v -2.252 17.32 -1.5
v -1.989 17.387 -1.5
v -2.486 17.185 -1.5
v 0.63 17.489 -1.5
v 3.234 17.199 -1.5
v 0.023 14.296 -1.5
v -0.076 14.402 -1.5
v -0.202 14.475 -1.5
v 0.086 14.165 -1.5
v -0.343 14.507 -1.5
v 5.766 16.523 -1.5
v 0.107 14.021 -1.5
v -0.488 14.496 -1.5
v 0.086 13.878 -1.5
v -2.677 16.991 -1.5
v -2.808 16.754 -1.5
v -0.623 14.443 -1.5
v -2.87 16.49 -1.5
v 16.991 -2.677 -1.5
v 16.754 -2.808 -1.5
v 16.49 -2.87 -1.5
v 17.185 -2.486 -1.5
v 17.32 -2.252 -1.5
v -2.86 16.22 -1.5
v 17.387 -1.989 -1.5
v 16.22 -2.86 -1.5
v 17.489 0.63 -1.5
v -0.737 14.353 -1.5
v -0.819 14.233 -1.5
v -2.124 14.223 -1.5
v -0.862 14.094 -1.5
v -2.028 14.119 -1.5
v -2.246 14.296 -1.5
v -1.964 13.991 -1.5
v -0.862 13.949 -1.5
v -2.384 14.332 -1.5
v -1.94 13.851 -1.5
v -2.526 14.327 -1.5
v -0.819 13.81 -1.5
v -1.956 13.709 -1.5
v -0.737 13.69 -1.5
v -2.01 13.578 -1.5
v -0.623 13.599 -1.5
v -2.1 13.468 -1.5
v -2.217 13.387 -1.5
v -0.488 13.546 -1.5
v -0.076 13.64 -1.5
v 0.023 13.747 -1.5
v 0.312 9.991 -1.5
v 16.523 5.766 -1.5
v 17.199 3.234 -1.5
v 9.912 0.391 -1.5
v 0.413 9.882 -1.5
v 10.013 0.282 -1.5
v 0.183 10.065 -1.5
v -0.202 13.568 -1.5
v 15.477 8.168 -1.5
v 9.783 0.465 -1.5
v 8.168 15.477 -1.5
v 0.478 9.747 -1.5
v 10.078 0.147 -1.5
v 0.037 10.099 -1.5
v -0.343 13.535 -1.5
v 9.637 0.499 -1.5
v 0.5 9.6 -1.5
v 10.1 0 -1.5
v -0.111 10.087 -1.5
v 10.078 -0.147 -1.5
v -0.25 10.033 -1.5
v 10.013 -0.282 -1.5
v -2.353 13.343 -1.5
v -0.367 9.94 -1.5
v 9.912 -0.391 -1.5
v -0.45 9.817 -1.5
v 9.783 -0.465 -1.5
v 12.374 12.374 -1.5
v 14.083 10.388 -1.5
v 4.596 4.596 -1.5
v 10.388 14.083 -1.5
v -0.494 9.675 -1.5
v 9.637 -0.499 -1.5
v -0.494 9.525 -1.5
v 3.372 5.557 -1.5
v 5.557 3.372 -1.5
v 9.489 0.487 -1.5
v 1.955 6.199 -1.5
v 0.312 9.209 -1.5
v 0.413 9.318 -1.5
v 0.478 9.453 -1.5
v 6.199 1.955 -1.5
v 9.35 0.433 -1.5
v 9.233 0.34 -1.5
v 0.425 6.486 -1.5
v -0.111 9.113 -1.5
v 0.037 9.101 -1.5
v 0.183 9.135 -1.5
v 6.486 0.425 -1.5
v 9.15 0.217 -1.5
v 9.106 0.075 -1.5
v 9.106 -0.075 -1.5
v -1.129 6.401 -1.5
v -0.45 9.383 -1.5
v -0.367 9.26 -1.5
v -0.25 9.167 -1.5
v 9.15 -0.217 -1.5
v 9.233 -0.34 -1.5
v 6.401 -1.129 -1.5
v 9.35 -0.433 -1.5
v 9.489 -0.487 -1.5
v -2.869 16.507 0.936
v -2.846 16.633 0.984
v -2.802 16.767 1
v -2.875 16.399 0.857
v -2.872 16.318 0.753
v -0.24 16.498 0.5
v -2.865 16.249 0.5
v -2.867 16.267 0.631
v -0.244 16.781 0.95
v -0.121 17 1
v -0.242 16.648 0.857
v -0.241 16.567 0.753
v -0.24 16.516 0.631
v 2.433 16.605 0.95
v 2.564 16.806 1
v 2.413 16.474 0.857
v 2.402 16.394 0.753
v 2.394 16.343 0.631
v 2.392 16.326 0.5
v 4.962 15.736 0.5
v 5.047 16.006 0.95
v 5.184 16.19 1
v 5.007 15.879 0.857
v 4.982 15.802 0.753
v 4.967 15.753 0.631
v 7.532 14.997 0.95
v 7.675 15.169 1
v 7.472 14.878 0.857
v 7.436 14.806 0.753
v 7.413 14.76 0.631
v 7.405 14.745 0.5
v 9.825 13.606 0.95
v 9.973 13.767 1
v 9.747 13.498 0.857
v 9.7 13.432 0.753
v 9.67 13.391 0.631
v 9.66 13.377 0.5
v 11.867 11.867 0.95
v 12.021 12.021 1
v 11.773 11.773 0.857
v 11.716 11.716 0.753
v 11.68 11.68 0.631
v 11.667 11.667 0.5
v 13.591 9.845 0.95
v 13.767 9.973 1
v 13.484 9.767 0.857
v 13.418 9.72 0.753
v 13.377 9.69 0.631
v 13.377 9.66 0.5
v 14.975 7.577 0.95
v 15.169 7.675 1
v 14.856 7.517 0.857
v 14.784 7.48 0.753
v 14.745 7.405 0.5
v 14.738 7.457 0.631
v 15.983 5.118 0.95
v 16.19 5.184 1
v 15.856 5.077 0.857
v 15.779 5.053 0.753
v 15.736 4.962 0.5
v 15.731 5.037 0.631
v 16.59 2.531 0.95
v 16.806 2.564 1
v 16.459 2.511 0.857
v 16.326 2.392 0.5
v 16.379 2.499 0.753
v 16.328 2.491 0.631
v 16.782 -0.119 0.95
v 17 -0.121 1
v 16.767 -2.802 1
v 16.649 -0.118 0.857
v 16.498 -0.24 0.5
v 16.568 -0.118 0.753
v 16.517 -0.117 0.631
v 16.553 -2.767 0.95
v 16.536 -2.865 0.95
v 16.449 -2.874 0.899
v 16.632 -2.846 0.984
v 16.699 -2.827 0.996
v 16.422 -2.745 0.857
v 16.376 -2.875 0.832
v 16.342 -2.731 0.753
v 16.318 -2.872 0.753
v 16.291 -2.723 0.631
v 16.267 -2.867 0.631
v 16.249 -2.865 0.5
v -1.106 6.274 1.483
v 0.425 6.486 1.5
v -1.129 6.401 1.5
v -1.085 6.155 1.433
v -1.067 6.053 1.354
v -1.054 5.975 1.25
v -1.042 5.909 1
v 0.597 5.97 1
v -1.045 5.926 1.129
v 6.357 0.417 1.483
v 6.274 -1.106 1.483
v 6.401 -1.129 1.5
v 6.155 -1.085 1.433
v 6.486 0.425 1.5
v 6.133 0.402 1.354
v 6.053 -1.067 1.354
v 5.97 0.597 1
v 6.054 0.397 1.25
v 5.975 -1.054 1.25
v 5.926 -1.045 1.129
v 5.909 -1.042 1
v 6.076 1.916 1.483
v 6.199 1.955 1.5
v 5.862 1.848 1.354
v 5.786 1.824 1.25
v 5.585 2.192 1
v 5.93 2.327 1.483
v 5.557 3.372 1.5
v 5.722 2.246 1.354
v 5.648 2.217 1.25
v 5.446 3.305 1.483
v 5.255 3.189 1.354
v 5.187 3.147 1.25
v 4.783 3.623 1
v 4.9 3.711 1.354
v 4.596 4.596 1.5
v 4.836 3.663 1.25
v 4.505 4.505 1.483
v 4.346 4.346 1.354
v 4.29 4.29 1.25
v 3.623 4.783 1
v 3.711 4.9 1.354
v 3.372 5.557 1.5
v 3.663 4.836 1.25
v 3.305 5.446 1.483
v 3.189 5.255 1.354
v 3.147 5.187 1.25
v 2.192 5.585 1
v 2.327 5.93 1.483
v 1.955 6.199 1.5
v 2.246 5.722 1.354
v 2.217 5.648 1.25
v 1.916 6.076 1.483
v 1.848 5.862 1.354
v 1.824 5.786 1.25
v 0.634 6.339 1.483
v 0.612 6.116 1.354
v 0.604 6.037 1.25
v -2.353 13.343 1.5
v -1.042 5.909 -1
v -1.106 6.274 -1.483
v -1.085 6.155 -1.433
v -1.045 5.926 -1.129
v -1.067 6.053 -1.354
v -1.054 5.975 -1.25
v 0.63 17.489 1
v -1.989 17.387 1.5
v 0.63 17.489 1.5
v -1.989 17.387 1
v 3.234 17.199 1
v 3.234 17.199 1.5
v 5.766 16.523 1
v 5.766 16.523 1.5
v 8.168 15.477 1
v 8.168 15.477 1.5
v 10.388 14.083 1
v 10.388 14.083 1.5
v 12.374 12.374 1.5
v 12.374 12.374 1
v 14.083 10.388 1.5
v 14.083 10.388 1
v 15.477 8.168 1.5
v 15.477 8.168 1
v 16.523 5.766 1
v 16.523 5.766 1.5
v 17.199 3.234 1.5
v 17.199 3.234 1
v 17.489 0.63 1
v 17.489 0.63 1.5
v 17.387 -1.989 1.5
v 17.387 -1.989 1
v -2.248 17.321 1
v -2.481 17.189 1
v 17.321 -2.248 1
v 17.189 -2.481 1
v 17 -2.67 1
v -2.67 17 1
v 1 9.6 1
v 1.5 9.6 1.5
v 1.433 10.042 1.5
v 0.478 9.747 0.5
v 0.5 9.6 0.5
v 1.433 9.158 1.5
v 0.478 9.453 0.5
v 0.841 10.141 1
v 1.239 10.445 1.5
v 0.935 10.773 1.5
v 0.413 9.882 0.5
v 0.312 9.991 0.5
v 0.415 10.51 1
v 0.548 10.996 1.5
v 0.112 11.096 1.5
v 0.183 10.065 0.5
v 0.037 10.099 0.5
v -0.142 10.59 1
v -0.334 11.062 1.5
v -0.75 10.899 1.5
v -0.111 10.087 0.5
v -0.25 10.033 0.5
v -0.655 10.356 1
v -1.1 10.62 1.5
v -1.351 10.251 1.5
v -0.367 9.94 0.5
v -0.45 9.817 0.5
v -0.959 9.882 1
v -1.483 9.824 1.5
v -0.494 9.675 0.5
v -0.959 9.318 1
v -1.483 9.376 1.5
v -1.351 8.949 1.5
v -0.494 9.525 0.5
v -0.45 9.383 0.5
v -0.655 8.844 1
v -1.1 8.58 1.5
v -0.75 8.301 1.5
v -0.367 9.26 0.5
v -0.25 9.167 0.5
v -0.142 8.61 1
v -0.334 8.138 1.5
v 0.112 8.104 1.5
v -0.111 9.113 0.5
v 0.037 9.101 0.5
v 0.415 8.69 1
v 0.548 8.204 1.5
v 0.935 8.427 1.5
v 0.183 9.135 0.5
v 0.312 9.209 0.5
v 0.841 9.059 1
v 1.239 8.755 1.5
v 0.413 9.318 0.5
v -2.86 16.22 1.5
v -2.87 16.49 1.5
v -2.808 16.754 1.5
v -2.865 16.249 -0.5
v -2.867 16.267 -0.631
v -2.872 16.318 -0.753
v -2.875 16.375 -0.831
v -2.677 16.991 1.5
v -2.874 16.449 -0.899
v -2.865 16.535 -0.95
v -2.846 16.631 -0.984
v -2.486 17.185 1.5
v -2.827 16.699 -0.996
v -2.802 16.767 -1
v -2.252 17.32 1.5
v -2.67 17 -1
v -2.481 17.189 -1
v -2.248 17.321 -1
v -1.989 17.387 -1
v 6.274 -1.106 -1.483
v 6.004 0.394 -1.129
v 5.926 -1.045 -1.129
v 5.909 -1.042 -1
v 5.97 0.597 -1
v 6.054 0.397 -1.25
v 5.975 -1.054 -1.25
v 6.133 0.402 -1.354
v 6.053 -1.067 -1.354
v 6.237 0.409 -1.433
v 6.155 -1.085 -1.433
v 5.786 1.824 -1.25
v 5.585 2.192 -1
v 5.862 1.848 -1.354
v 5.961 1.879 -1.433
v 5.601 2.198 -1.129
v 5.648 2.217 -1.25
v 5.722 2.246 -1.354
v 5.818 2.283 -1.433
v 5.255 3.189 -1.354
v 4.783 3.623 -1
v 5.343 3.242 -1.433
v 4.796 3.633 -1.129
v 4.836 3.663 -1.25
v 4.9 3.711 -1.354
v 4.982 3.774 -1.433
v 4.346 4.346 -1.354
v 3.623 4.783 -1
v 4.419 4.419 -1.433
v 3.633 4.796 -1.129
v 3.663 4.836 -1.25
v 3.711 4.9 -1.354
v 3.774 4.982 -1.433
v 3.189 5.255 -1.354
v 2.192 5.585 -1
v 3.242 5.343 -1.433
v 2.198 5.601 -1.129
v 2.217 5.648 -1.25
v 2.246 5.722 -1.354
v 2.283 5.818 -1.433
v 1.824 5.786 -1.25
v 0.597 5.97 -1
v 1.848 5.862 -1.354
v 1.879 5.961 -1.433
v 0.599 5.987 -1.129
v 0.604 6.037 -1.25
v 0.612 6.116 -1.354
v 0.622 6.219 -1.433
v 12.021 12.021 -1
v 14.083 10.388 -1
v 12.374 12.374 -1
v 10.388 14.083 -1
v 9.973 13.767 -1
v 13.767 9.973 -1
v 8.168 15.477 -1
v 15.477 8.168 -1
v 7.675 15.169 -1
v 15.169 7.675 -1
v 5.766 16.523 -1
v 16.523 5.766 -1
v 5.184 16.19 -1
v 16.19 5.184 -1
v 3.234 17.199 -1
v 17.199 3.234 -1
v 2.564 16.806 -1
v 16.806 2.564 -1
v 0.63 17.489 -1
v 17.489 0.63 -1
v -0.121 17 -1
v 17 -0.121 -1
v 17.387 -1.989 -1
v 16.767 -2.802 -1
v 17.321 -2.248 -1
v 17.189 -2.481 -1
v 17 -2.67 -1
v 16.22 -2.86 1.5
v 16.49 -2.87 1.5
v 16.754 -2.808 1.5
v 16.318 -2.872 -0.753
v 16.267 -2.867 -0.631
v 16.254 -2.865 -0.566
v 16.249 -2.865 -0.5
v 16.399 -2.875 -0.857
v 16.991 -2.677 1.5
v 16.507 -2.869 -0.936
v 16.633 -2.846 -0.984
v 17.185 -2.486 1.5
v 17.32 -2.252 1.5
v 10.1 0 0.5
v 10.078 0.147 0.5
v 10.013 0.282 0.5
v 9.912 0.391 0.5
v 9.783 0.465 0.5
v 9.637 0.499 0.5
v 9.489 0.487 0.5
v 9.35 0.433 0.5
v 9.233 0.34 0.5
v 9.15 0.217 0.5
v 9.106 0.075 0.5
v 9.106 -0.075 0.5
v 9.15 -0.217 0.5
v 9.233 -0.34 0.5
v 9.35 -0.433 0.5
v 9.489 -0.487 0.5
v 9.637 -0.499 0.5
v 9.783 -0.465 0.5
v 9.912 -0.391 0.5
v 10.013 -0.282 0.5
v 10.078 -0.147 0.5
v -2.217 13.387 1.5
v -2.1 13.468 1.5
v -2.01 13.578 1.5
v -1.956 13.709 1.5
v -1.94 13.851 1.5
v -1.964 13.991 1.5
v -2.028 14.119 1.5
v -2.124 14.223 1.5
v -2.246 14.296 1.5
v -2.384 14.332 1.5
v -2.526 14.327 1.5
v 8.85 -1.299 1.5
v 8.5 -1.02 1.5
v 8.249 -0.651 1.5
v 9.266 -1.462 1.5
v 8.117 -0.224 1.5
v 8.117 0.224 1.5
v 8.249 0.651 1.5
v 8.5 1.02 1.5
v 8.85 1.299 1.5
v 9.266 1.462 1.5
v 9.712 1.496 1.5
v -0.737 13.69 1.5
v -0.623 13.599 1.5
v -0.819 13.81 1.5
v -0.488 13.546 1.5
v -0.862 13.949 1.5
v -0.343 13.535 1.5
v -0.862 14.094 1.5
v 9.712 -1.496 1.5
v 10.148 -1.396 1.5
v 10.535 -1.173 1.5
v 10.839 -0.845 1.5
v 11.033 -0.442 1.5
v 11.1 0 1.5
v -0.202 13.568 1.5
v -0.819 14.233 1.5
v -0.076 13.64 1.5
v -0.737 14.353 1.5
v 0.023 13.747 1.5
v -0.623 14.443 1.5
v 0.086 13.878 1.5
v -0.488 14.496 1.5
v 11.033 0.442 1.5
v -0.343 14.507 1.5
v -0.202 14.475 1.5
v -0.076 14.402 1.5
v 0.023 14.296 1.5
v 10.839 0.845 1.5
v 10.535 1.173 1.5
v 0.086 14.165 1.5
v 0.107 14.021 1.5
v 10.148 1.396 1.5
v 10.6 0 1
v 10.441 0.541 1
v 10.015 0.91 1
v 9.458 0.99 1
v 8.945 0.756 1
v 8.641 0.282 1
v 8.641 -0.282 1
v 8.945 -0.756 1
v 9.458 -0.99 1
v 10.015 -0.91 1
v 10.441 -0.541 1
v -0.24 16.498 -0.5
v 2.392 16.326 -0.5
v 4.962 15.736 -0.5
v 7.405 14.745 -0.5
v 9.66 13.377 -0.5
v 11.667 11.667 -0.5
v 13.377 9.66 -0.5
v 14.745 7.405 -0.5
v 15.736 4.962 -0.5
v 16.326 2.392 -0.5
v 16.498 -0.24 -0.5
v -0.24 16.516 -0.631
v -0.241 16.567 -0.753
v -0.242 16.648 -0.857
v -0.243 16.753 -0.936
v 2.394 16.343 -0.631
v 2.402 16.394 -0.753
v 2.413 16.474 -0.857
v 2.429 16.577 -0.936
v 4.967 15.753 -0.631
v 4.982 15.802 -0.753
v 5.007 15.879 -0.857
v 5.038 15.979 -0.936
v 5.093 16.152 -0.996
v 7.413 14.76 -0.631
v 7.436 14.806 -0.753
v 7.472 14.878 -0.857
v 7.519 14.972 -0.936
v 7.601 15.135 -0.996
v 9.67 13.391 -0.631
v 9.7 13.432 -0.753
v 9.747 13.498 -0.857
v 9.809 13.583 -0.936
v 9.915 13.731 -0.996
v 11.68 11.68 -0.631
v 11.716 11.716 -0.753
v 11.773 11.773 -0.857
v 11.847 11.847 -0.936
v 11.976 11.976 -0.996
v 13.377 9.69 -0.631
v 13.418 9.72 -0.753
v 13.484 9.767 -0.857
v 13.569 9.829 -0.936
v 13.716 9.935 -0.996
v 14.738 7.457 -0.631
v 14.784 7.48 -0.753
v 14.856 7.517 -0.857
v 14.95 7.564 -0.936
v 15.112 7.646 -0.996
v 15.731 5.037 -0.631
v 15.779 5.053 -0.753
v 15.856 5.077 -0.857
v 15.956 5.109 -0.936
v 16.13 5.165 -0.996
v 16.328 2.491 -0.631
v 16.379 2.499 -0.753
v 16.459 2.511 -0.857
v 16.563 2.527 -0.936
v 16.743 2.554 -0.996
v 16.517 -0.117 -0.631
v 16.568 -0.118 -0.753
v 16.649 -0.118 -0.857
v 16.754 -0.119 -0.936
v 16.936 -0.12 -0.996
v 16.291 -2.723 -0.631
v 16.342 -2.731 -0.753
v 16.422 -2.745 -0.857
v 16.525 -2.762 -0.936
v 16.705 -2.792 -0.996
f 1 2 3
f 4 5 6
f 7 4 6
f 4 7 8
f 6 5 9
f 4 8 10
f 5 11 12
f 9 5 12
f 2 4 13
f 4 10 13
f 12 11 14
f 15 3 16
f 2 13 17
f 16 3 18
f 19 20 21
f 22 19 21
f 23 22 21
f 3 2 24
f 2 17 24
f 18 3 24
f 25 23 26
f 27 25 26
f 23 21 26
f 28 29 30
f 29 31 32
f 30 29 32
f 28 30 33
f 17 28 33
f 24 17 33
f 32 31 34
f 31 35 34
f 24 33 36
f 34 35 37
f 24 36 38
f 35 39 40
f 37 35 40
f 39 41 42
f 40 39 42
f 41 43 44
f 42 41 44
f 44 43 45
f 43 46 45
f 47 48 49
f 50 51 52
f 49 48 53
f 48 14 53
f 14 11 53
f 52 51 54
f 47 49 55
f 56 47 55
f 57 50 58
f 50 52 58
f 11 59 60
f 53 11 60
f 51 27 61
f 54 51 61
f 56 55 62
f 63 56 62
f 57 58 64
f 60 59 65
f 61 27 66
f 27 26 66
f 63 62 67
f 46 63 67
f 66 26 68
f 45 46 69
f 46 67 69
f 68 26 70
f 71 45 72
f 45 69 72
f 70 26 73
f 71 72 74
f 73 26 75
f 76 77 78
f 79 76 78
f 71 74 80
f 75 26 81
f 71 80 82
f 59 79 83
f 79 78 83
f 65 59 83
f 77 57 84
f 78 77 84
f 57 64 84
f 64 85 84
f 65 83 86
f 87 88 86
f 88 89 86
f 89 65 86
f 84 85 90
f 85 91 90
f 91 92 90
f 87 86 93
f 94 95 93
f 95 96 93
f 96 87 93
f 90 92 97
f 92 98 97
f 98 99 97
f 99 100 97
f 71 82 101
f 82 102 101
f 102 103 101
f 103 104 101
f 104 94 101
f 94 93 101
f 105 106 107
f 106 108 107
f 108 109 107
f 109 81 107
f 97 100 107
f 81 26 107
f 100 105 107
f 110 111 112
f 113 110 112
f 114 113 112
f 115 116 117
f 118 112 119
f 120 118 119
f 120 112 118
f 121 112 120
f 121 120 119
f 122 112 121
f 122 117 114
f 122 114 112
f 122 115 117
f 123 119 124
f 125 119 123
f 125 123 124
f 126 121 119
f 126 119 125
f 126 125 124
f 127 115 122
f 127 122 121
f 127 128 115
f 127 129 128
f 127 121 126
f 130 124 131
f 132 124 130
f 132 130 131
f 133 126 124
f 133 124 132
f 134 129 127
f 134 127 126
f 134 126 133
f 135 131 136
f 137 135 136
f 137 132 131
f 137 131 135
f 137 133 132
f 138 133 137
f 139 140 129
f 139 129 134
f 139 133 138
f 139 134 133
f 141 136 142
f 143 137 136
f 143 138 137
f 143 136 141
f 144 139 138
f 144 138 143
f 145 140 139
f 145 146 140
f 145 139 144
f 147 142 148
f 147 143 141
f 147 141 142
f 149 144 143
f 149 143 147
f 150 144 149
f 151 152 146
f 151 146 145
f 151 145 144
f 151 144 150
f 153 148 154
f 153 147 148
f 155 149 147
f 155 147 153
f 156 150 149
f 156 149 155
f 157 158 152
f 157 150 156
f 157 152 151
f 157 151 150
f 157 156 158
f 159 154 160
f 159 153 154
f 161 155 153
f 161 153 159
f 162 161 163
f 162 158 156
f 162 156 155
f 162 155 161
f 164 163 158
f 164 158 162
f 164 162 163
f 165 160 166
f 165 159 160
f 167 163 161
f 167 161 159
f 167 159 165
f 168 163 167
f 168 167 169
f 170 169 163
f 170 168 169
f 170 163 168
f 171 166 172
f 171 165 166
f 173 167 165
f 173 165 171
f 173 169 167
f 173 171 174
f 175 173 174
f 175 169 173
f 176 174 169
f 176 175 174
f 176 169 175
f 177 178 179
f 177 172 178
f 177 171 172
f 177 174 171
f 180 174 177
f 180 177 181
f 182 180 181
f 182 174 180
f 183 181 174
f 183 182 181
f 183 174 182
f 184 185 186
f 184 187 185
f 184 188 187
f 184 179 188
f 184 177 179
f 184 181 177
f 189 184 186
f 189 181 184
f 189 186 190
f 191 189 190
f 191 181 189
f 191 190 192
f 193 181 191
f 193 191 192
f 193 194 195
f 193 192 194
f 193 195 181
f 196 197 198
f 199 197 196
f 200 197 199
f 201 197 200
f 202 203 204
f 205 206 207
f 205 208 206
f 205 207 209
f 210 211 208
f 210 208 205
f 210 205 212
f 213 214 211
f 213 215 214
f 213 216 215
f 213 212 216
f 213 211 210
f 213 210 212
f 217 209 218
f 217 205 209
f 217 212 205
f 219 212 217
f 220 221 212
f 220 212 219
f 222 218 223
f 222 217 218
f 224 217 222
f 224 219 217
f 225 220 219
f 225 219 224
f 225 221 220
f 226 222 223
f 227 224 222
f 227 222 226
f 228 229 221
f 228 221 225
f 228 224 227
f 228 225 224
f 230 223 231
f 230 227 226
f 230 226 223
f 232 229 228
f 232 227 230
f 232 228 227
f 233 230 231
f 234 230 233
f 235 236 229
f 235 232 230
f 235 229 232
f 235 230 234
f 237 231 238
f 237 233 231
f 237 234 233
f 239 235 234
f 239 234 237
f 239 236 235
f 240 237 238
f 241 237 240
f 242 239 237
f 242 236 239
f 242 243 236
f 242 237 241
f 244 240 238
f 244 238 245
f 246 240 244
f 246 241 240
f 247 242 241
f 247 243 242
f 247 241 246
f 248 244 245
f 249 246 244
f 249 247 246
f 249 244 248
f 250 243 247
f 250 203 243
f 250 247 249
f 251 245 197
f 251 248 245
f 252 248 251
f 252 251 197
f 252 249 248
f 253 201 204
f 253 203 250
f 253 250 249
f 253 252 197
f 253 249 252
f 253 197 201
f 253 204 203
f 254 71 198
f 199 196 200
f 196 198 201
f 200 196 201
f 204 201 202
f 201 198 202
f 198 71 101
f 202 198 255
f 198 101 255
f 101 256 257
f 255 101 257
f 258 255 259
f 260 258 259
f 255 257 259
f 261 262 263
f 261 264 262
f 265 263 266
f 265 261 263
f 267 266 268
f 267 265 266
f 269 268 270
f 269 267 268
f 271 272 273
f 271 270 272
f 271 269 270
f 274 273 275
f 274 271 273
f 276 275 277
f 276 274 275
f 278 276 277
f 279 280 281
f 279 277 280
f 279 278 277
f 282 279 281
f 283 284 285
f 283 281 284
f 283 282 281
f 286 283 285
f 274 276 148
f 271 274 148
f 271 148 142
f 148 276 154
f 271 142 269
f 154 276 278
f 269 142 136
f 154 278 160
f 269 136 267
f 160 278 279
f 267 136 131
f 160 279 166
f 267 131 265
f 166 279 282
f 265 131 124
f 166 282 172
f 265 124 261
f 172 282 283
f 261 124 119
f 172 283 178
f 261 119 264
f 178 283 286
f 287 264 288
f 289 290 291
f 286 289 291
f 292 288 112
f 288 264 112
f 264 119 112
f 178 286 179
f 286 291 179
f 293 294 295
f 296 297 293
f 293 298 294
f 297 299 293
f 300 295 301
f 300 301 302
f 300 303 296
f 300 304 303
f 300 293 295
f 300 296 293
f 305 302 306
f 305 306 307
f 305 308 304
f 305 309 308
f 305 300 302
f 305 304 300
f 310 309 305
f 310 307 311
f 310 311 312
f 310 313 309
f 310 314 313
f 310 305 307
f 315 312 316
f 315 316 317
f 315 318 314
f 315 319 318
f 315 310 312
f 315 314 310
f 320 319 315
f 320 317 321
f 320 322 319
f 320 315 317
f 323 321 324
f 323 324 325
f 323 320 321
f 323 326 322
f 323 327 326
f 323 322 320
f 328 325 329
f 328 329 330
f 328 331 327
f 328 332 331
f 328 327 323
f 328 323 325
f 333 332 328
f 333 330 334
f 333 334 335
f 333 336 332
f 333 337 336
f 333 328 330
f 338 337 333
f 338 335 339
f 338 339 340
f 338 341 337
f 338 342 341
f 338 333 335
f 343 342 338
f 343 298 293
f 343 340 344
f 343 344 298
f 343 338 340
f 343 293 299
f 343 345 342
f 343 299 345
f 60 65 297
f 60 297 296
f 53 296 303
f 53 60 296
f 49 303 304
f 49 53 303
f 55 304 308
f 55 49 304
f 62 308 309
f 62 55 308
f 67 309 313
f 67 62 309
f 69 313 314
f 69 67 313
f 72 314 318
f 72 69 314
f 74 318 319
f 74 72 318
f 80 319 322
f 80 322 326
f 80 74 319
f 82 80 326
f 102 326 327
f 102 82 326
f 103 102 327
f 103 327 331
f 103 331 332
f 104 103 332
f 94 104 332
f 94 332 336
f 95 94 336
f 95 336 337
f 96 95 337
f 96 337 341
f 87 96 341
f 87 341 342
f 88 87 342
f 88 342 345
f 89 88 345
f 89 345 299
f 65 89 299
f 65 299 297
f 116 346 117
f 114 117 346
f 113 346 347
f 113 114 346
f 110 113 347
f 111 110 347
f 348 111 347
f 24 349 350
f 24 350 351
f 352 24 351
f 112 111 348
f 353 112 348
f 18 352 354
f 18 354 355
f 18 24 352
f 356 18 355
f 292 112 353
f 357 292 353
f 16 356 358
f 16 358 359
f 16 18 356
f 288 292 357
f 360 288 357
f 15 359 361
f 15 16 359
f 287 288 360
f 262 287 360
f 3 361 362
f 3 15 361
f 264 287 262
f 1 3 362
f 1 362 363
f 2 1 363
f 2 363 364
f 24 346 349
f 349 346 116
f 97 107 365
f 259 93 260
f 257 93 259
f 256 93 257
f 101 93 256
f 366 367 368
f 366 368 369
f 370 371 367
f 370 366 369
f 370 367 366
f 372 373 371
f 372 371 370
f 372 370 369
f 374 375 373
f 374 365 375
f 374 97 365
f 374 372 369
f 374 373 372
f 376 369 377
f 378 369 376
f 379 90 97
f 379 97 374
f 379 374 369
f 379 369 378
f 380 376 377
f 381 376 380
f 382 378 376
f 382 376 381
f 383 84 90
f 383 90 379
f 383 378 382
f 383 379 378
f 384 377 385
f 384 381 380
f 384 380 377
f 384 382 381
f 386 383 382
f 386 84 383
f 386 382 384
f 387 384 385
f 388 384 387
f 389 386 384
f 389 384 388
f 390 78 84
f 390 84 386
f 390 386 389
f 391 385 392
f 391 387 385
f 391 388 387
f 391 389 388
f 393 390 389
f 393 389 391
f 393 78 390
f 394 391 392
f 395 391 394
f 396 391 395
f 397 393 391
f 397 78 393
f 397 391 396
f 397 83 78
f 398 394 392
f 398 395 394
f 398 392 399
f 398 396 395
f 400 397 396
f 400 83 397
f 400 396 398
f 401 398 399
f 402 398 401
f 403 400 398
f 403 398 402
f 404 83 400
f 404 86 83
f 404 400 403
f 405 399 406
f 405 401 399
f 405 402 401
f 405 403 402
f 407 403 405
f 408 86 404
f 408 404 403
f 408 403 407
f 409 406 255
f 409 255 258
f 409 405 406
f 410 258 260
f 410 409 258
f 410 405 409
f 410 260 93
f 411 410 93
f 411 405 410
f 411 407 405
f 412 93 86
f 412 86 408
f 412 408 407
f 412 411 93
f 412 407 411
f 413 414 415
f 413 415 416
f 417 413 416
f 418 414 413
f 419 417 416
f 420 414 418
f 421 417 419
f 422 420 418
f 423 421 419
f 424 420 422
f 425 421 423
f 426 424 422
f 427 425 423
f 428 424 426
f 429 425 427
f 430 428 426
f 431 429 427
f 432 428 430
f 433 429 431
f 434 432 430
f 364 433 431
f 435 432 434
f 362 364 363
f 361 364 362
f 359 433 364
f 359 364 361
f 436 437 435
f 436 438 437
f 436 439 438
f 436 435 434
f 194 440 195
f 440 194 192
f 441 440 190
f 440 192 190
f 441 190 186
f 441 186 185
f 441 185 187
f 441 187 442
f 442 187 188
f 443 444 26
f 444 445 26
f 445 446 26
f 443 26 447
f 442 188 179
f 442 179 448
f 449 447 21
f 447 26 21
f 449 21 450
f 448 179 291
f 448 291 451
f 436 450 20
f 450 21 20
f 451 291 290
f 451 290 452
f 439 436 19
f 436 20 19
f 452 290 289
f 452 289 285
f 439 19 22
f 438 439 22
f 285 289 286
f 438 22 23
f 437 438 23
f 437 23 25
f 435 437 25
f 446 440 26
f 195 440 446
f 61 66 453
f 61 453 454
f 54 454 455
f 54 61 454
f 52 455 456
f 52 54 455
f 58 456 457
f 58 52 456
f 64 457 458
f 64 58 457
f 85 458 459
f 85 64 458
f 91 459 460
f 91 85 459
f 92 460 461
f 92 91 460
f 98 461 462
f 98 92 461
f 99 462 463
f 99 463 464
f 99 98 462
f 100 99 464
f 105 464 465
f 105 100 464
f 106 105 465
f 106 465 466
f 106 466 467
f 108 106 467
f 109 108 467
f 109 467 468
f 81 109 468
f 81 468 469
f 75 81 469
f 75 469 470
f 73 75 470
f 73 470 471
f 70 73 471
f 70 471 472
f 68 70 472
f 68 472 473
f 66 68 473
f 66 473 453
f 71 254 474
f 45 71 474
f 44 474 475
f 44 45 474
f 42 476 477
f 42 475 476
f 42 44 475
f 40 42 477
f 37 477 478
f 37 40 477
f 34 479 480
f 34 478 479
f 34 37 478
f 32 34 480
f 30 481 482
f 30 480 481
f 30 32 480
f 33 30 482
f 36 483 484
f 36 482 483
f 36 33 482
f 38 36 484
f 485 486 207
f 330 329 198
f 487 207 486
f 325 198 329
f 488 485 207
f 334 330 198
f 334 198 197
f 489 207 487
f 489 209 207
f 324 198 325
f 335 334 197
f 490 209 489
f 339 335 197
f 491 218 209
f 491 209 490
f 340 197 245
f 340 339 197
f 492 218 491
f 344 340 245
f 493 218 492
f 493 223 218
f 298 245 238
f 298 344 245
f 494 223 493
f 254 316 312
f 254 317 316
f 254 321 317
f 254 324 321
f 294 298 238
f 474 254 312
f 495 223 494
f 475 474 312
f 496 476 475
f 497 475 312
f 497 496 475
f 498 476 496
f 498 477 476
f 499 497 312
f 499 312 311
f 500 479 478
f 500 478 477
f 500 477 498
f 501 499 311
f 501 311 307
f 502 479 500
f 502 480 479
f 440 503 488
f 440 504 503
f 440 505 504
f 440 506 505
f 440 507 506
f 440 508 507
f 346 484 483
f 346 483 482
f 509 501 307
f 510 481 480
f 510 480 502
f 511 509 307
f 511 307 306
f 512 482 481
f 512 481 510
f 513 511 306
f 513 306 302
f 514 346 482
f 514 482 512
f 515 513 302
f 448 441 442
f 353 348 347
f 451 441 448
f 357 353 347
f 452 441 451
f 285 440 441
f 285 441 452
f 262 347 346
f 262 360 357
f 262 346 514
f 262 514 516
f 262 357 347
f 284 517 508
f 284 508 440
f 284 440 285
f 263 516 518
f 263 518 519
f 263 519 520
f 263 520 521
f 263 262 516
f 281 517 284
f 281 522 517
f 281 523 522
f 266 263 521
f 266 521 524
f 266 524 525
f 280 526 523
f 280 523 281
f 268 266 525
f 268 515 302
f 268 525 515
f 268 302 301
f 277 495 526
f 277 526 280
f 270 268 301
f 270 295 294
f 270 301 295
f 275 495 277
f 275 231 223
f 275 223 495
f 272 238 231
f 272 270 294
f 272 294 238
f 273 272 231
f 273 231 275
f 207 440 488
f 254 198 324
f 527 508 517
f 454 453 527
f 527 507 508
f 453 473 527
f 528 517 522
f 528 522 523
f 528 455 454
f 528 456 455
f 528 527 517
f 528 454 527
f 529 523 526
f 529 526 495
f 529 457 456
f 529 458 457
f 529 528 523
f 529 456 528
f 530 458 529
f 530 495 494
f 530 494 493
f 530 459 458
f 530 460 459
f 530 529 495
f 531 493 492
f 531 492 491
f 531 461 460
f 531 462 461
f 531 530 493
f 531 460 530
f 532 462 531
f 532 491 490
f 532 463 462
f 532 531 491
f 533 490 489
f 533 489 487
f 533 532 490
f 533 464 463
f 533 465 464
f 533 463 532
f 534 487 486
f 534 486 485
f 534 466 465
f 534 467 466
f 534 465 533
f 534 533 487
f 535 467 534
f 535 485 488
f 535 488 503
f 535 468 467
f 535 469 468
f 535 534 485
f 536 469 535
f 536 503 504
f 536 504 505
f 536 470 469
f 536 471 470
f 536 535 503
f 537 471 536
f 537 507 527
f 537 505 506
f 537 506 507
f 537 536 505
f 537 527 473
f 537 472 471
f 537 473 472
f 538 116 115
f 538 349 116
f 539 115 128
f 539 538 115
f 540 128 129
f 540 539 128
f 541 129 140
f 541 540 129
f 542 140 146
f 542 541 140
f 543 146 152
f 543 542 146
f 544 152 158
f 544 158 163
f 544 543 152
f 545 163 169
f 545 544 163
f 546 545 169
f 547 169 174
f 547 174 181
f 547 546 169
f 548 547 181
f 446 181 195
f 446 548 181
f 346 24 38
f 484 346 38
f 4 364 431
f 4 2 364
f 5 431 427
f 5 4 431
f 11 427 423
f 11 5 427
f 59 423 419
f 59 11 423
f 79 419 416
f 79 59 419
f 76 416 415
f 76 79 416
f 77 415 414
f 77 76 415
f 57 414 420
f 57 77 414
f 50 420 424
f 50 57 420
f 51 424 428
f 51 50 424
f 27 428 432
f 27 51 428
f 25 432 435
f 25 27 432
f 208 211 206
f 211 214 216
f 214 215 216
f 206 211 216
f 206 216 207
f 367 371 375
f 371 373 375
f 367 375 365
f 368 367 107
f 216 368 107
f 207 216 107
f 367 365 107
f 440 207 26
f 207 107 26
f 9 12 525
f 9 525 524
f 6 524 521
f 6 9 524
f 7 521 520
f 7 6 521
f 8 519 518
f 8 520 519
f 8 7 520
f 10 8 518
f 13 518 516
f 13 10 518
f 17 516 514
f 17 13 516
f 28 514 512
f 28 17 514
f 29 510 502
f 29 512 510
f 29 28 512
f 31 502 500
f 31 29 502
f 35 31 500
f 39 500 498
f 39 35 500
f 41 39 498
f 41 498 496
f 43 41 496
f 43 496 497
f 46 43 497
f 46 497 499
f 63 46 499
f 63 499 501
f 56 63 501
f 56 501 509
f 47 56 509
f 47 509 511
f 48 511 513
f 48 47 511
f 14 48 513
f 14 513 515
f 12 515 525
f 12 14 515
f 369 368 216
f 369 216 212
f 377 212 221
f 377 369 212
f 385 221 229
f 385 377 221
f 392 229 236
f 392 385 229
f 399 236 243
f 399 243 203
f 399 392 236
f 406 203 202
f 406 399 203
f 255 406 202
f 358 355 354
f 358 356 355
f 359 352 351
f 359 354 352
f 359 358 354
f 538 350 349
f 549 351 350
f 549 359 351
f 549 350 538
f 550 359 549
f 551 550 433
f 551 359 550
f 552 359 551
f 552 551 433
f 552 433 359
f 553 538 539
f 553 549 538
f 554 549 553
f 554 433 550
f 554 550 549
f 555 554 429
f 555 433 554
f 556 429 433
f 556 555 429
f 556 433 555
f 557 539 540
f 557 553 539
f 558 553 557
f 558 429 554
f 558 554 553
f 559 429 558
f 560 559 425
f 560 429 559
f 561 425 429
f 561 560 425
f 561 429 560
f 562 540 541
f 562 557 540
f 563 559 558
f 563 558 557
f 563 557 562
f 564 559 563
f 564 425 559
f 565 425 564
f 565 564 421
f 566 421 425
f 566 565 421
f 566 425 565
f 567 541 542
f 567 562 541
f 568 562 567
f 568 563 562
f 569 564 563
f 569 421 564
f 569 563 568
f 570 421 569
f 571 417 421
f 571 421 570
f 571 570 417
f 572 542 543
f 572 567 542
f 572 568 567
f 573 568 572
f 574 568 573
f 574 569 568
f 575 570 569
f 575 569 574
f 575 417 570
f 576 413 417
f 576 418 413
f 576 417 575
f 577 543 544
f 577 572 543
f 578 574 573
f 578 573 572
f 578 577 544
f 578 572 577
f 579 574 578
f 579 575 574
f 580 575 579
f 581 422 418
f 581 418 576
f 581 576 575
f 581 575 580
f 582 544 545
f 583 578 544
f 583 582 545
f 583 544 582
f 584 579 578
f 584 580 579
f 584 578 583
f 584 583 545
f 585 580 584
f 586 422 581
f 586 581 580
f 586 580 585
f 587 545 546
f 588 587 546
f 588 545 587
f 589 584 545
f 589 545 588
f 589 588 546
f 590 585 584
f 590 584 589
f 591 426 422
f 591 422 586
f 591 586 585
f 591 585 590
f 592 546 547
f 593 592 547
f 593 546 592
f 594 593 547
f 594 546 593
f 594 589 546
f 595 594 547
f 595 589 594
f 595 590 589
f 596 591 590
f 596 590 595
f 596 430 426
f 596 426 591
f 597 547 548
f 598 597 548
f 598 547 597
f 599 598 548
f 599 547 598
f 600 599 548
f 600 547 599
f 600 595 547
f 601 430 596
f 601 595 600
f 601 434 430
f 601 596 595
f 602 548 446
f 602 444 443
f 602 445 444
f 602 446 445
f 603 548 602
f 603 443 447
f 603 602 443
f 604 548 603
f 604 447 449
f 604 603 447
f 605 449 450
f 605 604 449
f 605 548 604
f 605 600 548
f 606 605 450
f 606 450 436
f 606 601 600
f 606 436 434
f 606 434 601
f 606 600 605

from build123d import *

# Parameters (mm, degrees)
SKETCH1_R               = 17
SKETCH1_R_2             = 0.49999999999999895
SKETCH1_R_3             = 6
SKETCH1_R_4             = 0.4999999999999985
SKETCH1_R_5             = 0.49999999999999967
SKETCH1_R_6             = 0.5000000000000008
BOSS_EXTRUDE1_DEPTH     = 1.5
SKETCH7_W               = 0.5
SKETCH7_H               = 0.5
CUT_EXTRUDE1_DEPTH      = 25.794152536434876
CUT_EXTRUDE1_DEPTH_BACK = 25.794152536434876
CUT_EXTRUDE2_DEPTH      = 25.92990172463582
CUT_EXTRUDE2_DEPTH_BACK = 25.92990172463582
SKETCH5_R               = 0.5000000000000009
SKETCH5_R_2             = 0.48729793970449836
FILLET1_R               = 0.5
CHAMFER1_SIZE           = 1
FILLET2_R               = 1


with BuildPart() as part:
    # Sketch1 → Boss-Extrude1 (new, symmetric)
    with BuildSketch(Plane.XY):
        Circle(SKETCH1_R)
        with Locations((9.600000000000001, 0)):
            Circle(SKETCH1_R_2, mode=Mode.SUBTRACT)
        Circle(SKETCH1_R_3, mode=Mode.SUBTRACT)
        with Locations((-3.352e-14, -9.600000000000001)):
            Circle(SKETCH1_R_4, mode=Mode.SUBTRACT)
        with Locations((-9.600000000000001, 6.704e-14)):
            Circle(SKETCH1_R_5, mode=Mode.SUBTRACT)
        with Locations((1.0055e-13, 9.600000000000001)):
            Circle(SKETCH1_R_6, mode=Mode.SUBTRACT)
    extrude(amount=BOSS_EXTRUDE1_DEPTH, both=True)

    # Sketch2 → Cut-Revolve1 (revolve, cut)
    with BuildSketch(Plane(origin=(0, 0, 0), x_dir=(1, 0, 0), z_dir=(0, 1, 0)), mode=Mode.PRIVATE) as cut_revolve1_sk:
        with BuildLine():
            Line((-16.5, -0.49999999999999956), (-16.5, 0.49999999999999956))
            ThreePointArc((-16.5, 0.49999999999999956), (-16.646446609406727, 0.8535533905932733), (-17, 1))
            Line((-17, 1), (-17, -1))
            ThreePointArc((-17, -1), (-16.646446609406727, -0.8535533905932733), (-16.5, -0.49999999999999956))
        make_face()
    revolve(cut_revolve1_sk.sketch.rotate(Axis((0, 0, 0), (0, 0, -1)), 180), axis=Axis((0, 0, 0), (0, 0, -1)), mode=Mode.SUBTRACT)

    # Sketch7 → Revolve1 (revolve)
    with BuildSketch(Plane(origin=(0, 0, 0), x_dir=(1, 0, 0), z_dir=(0, 1, 0))):
        with Locations((17.25, 1.25)):
            Rectangle(SKETCH7_W, SKETCH7_H)
        with Locations((17.25, -1.25)):
            Rectangle(SKETCH7_W, SKETCH7_H)
    revolve(axis=Axis((0, 0, 0), (0, 0, -1)))

    # Sketch4 → Cut-Extrude1 (cut, two sides: drawn at the far end of the back side and taken through both)
    with BuildSketch(Plane.XY.offset(-CUT_EXTRUDE1_DEPTH_BACK)):
        Polygon((-3.3089929101566358, 18.76623133261556), (0, 0), (18.766231332615533, -3.308992910156828), (18.766231332615533, -21.784688156780618), (-24.932091474912426, -21.784688156780618), (-24.93209147491243, 18.76623133261556), align=None)
    extrude(amount=CUT_EXTRUDE1_DEPTH + CUT_EXTRUDE1_DEPTH_BACK, mode=Mode.SUBTRACT)

    # Sketch5 → Cut-Extrude2 (cut, two sides: drawn at the far end of the back side and taken through both)
    with BuildSketch(Plane.XY.offset(1.5).offset(-CUT_EXTRUDE2_DEPTH_BACK)):
        with Locations((-2.439480379102094, 13.834980723316052)):
            Circle(SKETCH5_R)
        with Locations((-0.37984462011943565, 14.021287153916445)):
            Circle(SKETCH5_R_2)
    extrude(amount=CUT_EXTRUDE2_DEPTH + CUT_EXTRUDE2_DEPTH_BACK, mode=Mode.SUBTRACT)

    # Fillet1
    fillet1_edges = [part.edges().sort_by_distance(p)[0] for p in [
        (4.242640687119308, 4.242640687119264, 1.5),
        (4.242640687119308, 4.242640687119264, -1.5),
    ]]
    fillet(fillet1_edges, radius=FILLET1_R)

    # Chamfer1
    chamfer1_edges = [part.edges().sort_by_distance(p)[0] for p in [
        (9.100000000000003, 6e-17, 1.5),
        (-0.49999999999990025, 9.600000000000001, 1.5),
    ]]
    chamfer(chamfer1_edges, length=CHAMFER1_SIZE)

    # Fillet2
    fillet2_edges = [part.edges().sort_by_distance(p)[0] for p in [
        (17.23413567771362, -3.0388431091714043, 1.25),
        (-3.0388431091712285, 17.23413567771365, -1.25),
    ]]
    fillet(fillet2_edges, radius=FILLET2_R - 0.0001)  # a hair under: the kernel refuses the full size


solid = part.part
